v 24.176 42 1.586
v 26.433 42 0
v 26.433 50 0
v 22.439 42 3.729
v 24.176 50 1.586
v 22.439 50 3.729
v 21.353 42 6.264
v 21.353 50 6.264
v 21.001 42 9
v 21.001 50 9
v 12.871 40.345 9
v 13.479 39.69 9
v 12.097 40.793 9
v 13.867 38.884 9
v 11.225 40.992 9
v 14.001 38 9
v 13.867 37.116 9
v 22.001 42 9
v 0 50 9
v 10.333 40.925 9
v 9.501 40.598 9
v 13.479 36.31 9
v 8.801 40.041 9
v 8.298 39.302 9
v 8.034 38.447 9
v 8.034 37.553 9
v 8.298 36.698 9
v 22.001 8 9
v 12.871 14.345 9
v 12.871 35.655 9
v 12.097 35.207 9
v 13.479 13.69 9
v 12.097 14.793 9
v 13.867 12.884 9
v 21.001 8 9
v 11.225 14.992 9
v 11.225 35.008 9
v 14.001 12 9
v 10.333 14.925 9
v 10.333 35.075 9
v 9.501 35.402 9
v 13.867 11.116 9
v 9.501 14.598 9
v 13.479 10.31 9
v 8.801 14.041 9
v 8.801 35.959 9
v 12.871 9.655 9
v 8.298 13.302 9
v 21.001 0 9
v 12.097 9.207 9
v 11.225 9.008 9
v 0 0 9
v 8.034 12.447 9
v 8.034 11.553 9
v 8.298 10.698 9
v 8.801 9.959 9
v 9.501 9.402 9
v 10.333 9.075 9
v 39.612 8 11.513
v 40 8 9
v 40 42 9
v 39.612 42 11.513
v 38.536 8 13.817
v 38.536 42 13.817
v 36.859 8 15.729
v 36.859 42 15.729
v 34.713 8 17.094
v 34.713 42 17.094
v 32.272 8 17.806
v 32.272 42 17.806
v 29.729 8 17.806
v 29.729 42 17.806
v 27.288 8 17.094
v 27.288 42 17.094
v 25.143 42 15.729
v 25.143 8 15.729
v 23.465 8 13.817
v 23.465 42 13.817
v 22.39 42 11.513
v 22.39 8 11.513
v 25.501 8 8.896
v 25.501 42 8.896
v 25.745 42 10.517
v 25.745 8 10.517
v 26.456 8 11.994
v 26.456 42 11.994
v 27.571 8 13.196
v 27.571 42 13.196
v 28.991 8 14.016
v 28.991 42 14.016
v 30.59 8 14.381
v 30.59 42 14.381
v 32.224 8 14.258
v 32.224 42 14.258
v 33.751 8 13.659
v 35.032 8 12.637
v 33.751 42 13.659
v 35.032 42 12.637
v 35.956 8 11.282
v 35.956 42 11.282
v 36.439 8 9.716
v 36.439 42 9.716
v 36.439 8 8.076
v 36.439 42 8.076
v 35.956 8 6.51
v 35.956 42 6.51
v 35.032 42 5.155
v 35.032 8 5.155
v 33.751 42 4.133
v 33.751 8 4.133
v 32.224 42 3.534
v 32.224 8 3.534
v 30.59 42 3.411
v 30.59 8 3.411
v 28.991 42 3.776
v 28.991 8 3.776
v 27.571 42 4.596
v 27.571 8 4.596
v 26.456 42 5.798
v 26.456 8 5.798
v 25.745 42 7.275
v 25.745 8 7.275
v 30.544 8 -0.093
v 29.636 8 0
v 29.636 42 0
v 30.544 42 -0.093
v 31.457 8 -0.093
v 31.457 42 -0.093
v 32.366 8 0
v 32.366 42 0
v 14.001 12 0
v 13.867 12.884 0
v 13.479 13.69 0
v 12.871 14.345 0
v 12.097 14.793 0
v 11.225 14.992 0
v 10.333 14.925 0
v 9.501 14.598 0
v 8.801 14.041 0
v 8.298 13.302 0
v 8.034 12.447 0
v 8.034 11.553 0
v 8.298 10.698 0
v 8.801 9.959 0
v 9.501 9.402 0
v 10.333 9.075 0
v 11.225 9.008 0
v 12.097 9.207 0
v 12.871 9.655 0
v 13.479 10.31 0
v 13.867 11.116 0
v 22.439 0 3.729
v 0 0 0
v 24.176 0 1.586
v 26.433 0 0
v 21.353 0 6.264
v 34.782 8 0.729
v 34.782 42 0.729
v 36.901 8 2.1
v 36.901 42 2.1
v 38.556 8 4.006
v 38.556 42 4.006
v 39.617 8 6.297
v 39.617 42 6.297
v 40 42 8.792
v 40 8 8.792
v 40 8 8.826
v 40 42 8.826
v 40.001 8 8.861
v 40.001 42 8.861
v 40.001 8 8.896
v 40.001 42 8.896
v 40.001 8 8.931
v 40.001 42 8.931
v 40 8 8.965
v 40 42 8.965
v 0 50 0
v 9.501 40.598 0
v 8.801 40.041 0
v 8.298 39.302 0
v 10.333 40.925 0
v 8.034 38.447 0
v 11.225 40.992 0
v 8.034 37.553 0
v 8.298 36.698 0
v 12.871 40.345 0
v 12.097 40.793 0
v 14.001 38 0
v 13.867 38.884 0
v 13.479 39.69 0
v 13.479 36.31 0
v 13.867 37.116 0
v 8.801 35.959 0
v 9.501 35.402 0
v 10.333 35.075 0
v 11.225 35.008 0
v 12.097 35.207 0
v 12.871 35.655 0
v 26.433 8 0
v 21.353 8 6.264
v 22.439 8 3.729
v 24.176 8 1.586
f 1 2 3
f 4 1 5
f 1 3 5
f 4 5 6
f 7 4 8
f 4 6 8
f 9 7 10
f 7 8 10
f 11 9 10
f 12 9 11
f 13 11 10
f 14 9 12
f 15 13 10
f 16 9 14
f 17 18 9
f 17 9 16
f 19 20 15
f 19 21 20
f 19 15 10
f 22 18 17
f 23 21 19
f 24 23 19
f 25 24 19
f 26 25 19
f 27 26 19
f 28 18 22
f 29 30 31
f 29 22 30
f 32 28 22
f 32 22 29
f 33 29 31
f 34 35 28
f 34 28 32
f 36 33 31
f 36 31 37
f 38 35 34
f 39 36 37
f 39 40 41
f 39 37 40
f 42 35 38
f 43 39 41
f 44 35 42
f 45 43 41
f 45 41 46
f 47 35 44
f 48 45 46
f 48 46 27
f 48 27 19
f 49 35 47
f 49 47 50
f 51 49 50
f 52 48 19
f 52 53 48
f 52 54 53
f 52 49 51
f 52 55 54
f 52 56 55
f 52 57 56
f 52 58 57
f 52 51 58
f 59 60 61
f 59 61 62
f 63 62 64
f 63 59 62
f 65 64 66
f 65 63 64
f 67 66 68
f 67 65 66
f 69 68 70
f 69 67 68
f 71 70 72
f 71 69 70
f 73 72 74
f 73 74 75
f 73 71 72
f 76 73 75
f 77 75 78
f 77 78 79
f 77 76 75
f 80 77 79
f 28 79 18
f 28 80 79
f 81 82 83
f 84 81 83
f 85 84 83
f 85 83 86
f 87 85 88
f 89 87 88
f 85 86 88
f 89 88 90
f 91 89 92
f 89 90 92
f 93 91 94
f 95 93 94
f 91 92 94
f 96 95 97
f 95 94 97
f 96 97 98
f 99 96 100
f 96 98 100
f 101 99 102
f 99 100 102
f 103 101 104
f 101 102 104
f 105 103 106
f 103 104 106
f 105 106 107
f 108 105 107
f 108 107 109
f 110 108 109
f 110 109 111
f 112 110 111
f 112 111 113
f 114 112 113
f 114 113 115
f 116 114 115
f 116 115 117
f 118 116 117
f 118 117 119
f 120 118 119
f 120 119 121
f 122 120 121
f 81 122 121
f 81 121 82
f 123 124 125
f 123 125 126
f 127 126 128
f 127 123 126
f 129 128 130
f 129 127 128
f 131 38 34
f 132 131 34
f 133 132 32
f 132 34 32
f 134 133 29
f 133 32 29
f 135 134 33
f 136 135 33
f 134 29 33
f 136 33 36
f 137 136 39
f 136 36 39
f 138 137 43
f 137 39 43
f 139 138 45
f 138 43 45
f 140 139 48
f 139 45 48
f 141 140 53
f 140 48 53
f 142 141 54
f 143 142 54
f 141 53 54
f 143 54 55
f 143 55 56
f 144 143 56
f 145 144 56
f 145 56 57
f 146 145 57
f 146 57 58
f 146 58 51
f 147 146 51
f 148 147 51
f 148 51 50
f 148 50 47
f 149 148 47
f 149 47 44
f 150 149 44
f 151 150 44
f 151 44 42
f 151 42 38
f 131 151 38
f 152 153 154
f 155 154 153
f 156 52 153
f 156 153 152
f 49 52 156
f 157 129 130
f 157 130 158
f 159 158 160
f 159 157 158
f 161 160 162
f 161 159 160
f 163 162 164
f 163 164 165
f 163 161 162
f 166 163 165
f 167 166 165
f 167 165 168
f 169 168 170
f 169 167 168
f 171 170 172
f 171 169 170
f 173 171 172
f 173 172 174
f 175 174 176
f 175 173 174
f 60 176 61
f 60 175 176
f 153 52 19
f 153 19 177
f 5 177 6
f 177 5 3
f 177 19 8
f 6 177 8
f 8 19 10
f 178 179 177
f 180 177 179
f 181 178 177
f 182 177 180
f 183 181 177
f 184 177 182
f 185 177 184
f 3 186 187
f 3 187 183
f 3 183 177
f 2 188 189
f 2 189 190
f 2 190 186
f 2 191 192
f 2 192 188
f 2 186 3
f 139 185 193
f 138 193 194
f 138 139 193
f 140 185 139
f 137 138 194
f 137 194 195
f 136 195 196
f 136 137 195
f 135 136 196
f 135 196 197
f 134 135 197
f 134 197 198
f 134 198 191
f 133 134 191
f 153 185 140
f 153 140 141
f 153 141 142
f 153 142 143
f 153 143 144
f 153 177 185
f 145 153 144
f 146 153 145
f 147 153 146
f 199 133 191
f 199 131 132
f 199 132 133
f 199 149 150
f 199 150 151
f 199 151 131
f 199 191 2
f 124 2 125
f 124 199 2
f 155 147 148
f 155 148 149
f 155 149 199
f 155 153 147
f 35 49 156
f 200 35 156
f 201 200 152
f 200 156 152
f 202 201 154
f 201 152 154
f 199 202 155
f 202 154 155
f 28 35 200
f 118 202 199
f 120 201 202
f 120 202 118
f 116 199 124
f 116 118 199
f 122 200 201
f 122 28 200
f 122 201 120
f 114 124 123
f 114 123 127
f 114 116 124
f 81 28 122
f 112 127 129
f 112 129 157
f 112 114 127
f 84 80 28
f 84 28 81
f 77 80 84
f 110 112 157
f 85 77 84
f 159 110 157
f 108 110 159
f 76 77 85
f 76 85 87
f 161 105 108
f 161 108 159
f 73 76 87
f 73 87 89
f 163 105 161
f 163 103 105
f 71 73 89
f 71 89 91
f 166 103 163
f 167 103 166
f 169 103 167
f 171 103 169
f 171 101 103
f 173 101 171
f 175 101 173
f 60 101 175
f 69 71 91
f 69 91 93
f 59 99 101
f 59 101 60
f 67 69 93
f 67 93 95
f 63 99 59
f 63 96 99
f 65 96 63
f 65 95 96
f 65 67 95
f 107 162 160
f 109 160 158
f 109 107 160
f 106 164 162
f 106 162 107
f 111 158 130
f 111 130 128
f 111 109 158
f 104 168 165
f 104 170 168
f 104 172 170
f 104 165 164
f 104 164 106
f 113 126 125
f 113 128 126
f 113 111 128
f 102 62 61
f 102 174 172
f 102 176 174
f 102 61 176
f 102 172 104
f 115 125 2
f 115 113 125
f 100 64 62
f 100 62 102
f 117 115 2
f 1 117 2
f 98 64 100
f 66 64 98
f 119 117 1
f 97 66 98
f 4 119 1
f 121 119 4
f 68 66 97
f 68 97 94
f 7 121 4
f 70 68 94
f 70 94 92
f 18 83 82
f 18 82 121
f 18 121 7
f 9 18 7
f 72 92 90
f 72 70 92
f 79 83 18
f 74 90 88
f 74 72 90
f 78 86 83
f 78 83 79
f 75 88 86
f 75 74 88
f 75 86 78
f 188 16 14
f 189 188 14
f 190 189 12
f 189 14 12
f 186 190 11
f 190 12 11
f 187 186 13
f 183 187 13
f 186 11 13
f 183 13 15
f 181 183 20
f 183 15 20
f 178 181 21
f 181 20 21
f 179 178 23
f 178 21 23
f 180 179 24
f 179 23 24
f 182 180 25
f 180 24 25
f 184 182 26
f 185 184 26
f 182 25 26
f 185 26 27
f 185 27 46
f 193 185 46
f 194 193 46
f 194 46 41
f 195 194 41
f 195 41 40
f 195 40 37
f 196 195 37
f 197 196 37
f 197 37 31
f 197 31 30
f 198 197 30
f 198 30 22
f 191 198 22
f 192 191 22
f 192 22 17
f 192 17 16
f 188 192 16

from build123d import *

# Parameters (mm, degrees)
F1_DEPTH  = 50
F2_R      = 3
F3_DEPTH  = 25
F5_R      = 10
F6_DEPTH  = 8
F7_R      = 10
F8_DEPTH  = 8
F9_R      = 5.5
F10_DEPTH = 42.001


with BuildPart() as f1:
    # F0 (on Front) → F1 (new body)
    with BuildSketch(Plane.XZ):
        with BuildLine():
            Line((0, 9), (0, 0))
            Line((0, 0), (29.635604, 0))
            ThreePointArc((29.635604, 0), (24.137281, 3.073959), (22.001204, 9))
            Line((22.001204, 9), (0, 9))
        make_face()
        with BuildLine():
            ThreePointArc((22.001204, 9), (24.137281, 3.073959), (29.635604, 0))
            Line((29.635604, 0), (32.3656, 0))
            ThreePointArc((32.3656, 0), (37.796114, 2.994952), (40, 8.791771))
            Line((40, 8.791771), (40, 9))
            ThreePointArc((40, 9), (31.000602, 17.895886), (22.001204, 9))
        make_face()
        with BuildLine():
            Line((32.3656, 0), (29.635604, 0))
            ThreePointArc((29.635604, 0), (31.000602, -0.104114), (32.3656, 0))
        make_face()
        with BuildLine():
            Line((40, 9), (40, 8.791771))
            ThreePointArc((40, 8.791771), (40.000452, 8.843828), (40.000602, 8.895886))
            ThreePointArc((40.000602, 8.895886), (40.000452, 8.947944), (40, 9))
        make_face()
    extrude(amount=-F1_DEPTH)

    # F2 (on face) → F3 (cut)
    with BuildSketch(Plane.XY.offset(9)):
        with Locations((11.000602, 38)):
            Circle(F2_R)
        with Locations((11.000602, 12)):
            Circle(F2_R)
    extrude(amount=-F3_DEPTH, mode=Mode.SUBTRACT)

    # F5 (on face) → F6 (cut)
    with BuildSketch(Plane.XZ):
        with Locations((31.000602, 8.895886)):
            Circle(F5_R)
    extrude(amount=-F6_DEPTH, mode=Mode.SUBTRACT)

    # F7 (on face) → F8 (cut)
    with BuildSketch(Plane(origin=(0, 50, 0), x_dir=(-1, 0, 0), z_dir=(0, 1, 0))):
        with Locations((-31.000602, 8.895886)):
            Circle(F7_R)
    extrude(amount=-F8_DEPTH, mode=Mode.SUBTRACT)

    # F9 (on face) → F10 (cut, through all)
    with BuildSketch(Plane(origin=(0, 42, 0), x_dir=(-1, 0, 0), z_dir=(0, 1, 0))):
        with Locations((-31.000602, 8.895886)):
            Circle(F9_R)
    extrude(amount=-F10_DEPTH, mode=Mode.SUBTRACT)


solid = f1.part
